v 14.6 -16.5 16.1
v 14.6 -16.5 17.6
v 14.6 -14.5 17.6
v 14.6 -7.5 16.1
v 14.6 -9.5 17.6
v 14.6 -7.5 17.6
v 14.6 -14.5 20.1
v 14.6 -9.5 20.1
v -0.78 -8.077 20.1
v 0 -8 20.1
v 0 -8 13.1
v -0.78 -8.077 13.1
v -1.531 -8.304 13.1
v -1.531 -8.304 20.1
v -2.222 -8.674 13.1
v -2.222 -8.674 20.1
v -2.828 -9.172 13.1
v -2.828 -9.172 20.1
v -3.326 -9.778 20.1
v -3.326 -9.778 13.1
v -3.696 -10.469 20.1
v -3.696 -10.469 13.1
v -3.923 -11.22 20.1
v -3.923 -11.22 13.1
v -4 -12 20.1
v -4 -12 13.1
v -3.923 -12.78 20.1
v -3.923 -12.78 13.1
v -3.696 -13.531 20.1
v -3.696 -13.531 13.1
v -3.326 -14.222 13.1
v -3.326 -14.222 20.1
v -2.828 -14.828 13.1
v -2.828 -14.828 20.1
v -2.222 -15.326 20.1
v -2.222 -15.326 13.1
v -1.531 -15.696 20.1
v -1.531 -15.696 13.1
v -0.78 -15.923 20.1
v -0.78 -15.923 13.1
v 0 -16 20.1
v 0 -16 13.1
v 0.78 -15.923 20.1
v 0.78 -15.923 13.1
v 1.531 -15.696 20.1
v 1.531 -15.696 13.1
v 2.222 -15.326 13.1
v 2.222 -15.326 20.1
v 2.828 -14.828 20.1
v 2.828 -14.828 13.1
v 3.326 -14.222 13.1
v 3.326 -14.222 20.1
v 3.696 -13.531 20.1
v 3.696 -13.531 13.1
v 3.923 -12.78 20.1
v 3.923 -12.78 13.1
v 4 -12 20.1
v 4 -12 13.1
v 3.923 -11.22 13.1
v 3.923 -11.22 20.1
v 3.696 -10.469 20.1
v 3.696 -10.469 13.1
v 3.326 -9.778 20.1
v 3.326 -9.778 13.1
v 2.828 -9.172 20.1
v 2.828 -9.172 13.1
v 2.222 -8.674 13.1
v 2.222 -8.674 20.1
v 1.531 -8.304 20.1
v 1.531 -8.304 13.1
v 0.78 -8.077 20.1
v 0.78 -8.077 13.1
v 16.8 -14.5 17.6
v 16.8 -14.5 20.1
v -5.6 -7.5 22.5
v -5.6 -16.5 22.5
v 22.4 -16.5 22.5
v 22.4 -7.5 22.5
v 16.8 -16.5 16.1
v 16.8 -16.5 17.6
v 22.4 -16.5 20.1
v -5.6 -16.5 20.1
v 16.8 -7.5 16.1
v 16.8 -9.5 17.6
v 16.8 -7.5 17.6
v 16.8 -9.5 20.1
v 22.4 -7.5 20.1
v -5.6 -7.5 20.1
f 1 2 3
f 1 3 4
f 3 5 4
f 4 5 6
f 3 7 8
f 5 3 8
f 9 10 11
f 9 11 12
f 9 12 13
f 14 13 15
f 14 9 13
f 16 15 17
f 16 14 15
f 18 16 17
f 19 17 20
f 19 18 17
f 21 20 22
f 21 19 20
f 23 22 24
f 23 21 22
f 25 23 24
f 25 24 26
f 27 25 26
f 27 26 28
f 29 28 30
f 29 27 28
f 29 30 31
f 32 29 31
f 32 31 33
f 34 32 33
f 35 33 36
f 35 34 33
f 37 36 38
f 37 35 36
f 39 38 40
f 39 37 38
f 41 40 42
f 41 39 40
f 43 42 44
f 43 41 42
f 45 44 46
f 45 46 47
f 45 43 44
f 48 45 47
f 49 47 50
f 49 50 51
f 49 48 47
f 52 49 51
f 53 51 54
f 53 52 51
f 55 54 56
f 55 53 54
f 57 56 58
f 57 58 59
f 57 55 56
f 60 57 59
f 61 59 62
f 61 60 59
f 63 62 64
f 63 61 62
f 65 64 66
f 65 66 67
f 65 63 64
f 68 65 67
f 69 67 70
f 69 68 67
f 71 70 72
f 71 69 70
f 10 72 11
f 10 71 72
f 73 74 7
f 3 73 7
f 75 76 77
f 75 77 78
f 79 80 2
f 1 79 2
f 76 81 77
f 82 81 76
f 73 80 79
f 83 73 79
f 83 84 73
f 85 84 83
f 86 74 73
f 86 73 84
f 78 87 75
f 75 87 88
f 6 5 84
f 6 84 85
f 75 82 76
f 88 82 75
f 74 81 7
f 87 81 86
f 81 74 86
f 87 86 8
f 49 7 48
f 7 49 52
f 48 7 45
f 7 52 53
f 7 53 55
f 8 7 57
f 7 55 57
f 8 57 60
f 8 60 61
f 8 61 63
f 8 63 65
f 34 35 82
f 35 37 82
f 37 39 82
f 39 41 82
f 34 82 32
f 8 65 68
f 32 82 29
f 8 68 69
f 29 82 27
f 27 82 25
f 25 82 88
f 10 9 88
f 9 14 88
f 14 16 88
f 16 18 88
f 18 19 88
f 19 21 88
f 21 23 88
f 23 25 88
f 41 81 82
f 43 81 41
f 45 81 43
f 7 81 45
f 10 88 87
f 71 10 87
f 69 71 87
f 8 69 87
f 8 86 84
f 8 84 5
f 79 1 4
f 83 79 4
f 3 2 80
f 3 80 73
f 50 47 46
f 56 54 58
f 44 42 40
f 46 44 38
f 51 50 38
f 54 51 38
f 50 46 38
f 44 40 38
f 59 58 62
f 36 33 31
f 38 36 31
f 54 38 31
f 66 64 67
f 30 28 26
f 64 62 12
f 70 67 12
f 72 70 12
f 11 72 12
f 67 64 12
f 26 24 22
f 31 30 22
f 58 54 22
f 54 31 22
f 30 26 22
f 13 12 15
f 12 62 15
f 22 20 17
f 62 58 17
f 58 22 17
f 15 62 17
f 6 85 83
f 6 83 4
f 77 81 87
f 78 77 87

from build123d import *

# Parameters (mm, degrees)
SKETCH115_W             = 9
SKETCH115_H             = 28
PAD054_DEPTH            = 2.4
SKETCH116_W             = 5
SKETCH116_H             = 2.2
PAD055_DEPTH            = 2.5
SKETCH118_W             = 9
SKETCH118_H             = 2.2
PAD057_DEPTH            = 1.5
SKETCH119_R             = 4
PAD058_DEPTH            = 7
BODY014_PLACEMENT_ANGLE = 90


with BuildPart() as part:
    # Sketch115 → Pad054 (new body)
    with BuildSketch(Plane.XY):
        Rectangle(SKETCH115_W, SKETCH115_H)
    extrude(amount=PAD054_DEPTH)

    # Sketch116 → Pad055 (join)
    with BuildSketch(Plane.XY):
        with Locations((0, -7.3)):
            Rectangle(SKETCH116_W, SKETCH116_H)
    extrude(amount=-PAD055_DEPTH)

    # Sketch118 → Pad057 (join)
    with BuildSketch(Plane.XY.offset(-2.5)):
        with Locations((0, -7.3)):
            Rectangle(SKETCH118_W, SKETCH118_H)
    extrude(amount=-PAD057_DEPTH)

    # Sketch119 → Pad058 (join)
    with BuildSketch(Plane.XY):
        with Locations((0, 8.4)):
            Circle(SKETCH119_R)
    extrude(amount=-PAD058_DEPTH)


with BuildPart() as part_1:
    # Body014 placement: moved
    add(part.part.moved(Location((8.4, -12, 20.1))).rotate(Axis((8.4, -12, 20.1), (0, 0, 1)), BODY014_PLACEMENT_ANGLE))


solid = part_1.part
